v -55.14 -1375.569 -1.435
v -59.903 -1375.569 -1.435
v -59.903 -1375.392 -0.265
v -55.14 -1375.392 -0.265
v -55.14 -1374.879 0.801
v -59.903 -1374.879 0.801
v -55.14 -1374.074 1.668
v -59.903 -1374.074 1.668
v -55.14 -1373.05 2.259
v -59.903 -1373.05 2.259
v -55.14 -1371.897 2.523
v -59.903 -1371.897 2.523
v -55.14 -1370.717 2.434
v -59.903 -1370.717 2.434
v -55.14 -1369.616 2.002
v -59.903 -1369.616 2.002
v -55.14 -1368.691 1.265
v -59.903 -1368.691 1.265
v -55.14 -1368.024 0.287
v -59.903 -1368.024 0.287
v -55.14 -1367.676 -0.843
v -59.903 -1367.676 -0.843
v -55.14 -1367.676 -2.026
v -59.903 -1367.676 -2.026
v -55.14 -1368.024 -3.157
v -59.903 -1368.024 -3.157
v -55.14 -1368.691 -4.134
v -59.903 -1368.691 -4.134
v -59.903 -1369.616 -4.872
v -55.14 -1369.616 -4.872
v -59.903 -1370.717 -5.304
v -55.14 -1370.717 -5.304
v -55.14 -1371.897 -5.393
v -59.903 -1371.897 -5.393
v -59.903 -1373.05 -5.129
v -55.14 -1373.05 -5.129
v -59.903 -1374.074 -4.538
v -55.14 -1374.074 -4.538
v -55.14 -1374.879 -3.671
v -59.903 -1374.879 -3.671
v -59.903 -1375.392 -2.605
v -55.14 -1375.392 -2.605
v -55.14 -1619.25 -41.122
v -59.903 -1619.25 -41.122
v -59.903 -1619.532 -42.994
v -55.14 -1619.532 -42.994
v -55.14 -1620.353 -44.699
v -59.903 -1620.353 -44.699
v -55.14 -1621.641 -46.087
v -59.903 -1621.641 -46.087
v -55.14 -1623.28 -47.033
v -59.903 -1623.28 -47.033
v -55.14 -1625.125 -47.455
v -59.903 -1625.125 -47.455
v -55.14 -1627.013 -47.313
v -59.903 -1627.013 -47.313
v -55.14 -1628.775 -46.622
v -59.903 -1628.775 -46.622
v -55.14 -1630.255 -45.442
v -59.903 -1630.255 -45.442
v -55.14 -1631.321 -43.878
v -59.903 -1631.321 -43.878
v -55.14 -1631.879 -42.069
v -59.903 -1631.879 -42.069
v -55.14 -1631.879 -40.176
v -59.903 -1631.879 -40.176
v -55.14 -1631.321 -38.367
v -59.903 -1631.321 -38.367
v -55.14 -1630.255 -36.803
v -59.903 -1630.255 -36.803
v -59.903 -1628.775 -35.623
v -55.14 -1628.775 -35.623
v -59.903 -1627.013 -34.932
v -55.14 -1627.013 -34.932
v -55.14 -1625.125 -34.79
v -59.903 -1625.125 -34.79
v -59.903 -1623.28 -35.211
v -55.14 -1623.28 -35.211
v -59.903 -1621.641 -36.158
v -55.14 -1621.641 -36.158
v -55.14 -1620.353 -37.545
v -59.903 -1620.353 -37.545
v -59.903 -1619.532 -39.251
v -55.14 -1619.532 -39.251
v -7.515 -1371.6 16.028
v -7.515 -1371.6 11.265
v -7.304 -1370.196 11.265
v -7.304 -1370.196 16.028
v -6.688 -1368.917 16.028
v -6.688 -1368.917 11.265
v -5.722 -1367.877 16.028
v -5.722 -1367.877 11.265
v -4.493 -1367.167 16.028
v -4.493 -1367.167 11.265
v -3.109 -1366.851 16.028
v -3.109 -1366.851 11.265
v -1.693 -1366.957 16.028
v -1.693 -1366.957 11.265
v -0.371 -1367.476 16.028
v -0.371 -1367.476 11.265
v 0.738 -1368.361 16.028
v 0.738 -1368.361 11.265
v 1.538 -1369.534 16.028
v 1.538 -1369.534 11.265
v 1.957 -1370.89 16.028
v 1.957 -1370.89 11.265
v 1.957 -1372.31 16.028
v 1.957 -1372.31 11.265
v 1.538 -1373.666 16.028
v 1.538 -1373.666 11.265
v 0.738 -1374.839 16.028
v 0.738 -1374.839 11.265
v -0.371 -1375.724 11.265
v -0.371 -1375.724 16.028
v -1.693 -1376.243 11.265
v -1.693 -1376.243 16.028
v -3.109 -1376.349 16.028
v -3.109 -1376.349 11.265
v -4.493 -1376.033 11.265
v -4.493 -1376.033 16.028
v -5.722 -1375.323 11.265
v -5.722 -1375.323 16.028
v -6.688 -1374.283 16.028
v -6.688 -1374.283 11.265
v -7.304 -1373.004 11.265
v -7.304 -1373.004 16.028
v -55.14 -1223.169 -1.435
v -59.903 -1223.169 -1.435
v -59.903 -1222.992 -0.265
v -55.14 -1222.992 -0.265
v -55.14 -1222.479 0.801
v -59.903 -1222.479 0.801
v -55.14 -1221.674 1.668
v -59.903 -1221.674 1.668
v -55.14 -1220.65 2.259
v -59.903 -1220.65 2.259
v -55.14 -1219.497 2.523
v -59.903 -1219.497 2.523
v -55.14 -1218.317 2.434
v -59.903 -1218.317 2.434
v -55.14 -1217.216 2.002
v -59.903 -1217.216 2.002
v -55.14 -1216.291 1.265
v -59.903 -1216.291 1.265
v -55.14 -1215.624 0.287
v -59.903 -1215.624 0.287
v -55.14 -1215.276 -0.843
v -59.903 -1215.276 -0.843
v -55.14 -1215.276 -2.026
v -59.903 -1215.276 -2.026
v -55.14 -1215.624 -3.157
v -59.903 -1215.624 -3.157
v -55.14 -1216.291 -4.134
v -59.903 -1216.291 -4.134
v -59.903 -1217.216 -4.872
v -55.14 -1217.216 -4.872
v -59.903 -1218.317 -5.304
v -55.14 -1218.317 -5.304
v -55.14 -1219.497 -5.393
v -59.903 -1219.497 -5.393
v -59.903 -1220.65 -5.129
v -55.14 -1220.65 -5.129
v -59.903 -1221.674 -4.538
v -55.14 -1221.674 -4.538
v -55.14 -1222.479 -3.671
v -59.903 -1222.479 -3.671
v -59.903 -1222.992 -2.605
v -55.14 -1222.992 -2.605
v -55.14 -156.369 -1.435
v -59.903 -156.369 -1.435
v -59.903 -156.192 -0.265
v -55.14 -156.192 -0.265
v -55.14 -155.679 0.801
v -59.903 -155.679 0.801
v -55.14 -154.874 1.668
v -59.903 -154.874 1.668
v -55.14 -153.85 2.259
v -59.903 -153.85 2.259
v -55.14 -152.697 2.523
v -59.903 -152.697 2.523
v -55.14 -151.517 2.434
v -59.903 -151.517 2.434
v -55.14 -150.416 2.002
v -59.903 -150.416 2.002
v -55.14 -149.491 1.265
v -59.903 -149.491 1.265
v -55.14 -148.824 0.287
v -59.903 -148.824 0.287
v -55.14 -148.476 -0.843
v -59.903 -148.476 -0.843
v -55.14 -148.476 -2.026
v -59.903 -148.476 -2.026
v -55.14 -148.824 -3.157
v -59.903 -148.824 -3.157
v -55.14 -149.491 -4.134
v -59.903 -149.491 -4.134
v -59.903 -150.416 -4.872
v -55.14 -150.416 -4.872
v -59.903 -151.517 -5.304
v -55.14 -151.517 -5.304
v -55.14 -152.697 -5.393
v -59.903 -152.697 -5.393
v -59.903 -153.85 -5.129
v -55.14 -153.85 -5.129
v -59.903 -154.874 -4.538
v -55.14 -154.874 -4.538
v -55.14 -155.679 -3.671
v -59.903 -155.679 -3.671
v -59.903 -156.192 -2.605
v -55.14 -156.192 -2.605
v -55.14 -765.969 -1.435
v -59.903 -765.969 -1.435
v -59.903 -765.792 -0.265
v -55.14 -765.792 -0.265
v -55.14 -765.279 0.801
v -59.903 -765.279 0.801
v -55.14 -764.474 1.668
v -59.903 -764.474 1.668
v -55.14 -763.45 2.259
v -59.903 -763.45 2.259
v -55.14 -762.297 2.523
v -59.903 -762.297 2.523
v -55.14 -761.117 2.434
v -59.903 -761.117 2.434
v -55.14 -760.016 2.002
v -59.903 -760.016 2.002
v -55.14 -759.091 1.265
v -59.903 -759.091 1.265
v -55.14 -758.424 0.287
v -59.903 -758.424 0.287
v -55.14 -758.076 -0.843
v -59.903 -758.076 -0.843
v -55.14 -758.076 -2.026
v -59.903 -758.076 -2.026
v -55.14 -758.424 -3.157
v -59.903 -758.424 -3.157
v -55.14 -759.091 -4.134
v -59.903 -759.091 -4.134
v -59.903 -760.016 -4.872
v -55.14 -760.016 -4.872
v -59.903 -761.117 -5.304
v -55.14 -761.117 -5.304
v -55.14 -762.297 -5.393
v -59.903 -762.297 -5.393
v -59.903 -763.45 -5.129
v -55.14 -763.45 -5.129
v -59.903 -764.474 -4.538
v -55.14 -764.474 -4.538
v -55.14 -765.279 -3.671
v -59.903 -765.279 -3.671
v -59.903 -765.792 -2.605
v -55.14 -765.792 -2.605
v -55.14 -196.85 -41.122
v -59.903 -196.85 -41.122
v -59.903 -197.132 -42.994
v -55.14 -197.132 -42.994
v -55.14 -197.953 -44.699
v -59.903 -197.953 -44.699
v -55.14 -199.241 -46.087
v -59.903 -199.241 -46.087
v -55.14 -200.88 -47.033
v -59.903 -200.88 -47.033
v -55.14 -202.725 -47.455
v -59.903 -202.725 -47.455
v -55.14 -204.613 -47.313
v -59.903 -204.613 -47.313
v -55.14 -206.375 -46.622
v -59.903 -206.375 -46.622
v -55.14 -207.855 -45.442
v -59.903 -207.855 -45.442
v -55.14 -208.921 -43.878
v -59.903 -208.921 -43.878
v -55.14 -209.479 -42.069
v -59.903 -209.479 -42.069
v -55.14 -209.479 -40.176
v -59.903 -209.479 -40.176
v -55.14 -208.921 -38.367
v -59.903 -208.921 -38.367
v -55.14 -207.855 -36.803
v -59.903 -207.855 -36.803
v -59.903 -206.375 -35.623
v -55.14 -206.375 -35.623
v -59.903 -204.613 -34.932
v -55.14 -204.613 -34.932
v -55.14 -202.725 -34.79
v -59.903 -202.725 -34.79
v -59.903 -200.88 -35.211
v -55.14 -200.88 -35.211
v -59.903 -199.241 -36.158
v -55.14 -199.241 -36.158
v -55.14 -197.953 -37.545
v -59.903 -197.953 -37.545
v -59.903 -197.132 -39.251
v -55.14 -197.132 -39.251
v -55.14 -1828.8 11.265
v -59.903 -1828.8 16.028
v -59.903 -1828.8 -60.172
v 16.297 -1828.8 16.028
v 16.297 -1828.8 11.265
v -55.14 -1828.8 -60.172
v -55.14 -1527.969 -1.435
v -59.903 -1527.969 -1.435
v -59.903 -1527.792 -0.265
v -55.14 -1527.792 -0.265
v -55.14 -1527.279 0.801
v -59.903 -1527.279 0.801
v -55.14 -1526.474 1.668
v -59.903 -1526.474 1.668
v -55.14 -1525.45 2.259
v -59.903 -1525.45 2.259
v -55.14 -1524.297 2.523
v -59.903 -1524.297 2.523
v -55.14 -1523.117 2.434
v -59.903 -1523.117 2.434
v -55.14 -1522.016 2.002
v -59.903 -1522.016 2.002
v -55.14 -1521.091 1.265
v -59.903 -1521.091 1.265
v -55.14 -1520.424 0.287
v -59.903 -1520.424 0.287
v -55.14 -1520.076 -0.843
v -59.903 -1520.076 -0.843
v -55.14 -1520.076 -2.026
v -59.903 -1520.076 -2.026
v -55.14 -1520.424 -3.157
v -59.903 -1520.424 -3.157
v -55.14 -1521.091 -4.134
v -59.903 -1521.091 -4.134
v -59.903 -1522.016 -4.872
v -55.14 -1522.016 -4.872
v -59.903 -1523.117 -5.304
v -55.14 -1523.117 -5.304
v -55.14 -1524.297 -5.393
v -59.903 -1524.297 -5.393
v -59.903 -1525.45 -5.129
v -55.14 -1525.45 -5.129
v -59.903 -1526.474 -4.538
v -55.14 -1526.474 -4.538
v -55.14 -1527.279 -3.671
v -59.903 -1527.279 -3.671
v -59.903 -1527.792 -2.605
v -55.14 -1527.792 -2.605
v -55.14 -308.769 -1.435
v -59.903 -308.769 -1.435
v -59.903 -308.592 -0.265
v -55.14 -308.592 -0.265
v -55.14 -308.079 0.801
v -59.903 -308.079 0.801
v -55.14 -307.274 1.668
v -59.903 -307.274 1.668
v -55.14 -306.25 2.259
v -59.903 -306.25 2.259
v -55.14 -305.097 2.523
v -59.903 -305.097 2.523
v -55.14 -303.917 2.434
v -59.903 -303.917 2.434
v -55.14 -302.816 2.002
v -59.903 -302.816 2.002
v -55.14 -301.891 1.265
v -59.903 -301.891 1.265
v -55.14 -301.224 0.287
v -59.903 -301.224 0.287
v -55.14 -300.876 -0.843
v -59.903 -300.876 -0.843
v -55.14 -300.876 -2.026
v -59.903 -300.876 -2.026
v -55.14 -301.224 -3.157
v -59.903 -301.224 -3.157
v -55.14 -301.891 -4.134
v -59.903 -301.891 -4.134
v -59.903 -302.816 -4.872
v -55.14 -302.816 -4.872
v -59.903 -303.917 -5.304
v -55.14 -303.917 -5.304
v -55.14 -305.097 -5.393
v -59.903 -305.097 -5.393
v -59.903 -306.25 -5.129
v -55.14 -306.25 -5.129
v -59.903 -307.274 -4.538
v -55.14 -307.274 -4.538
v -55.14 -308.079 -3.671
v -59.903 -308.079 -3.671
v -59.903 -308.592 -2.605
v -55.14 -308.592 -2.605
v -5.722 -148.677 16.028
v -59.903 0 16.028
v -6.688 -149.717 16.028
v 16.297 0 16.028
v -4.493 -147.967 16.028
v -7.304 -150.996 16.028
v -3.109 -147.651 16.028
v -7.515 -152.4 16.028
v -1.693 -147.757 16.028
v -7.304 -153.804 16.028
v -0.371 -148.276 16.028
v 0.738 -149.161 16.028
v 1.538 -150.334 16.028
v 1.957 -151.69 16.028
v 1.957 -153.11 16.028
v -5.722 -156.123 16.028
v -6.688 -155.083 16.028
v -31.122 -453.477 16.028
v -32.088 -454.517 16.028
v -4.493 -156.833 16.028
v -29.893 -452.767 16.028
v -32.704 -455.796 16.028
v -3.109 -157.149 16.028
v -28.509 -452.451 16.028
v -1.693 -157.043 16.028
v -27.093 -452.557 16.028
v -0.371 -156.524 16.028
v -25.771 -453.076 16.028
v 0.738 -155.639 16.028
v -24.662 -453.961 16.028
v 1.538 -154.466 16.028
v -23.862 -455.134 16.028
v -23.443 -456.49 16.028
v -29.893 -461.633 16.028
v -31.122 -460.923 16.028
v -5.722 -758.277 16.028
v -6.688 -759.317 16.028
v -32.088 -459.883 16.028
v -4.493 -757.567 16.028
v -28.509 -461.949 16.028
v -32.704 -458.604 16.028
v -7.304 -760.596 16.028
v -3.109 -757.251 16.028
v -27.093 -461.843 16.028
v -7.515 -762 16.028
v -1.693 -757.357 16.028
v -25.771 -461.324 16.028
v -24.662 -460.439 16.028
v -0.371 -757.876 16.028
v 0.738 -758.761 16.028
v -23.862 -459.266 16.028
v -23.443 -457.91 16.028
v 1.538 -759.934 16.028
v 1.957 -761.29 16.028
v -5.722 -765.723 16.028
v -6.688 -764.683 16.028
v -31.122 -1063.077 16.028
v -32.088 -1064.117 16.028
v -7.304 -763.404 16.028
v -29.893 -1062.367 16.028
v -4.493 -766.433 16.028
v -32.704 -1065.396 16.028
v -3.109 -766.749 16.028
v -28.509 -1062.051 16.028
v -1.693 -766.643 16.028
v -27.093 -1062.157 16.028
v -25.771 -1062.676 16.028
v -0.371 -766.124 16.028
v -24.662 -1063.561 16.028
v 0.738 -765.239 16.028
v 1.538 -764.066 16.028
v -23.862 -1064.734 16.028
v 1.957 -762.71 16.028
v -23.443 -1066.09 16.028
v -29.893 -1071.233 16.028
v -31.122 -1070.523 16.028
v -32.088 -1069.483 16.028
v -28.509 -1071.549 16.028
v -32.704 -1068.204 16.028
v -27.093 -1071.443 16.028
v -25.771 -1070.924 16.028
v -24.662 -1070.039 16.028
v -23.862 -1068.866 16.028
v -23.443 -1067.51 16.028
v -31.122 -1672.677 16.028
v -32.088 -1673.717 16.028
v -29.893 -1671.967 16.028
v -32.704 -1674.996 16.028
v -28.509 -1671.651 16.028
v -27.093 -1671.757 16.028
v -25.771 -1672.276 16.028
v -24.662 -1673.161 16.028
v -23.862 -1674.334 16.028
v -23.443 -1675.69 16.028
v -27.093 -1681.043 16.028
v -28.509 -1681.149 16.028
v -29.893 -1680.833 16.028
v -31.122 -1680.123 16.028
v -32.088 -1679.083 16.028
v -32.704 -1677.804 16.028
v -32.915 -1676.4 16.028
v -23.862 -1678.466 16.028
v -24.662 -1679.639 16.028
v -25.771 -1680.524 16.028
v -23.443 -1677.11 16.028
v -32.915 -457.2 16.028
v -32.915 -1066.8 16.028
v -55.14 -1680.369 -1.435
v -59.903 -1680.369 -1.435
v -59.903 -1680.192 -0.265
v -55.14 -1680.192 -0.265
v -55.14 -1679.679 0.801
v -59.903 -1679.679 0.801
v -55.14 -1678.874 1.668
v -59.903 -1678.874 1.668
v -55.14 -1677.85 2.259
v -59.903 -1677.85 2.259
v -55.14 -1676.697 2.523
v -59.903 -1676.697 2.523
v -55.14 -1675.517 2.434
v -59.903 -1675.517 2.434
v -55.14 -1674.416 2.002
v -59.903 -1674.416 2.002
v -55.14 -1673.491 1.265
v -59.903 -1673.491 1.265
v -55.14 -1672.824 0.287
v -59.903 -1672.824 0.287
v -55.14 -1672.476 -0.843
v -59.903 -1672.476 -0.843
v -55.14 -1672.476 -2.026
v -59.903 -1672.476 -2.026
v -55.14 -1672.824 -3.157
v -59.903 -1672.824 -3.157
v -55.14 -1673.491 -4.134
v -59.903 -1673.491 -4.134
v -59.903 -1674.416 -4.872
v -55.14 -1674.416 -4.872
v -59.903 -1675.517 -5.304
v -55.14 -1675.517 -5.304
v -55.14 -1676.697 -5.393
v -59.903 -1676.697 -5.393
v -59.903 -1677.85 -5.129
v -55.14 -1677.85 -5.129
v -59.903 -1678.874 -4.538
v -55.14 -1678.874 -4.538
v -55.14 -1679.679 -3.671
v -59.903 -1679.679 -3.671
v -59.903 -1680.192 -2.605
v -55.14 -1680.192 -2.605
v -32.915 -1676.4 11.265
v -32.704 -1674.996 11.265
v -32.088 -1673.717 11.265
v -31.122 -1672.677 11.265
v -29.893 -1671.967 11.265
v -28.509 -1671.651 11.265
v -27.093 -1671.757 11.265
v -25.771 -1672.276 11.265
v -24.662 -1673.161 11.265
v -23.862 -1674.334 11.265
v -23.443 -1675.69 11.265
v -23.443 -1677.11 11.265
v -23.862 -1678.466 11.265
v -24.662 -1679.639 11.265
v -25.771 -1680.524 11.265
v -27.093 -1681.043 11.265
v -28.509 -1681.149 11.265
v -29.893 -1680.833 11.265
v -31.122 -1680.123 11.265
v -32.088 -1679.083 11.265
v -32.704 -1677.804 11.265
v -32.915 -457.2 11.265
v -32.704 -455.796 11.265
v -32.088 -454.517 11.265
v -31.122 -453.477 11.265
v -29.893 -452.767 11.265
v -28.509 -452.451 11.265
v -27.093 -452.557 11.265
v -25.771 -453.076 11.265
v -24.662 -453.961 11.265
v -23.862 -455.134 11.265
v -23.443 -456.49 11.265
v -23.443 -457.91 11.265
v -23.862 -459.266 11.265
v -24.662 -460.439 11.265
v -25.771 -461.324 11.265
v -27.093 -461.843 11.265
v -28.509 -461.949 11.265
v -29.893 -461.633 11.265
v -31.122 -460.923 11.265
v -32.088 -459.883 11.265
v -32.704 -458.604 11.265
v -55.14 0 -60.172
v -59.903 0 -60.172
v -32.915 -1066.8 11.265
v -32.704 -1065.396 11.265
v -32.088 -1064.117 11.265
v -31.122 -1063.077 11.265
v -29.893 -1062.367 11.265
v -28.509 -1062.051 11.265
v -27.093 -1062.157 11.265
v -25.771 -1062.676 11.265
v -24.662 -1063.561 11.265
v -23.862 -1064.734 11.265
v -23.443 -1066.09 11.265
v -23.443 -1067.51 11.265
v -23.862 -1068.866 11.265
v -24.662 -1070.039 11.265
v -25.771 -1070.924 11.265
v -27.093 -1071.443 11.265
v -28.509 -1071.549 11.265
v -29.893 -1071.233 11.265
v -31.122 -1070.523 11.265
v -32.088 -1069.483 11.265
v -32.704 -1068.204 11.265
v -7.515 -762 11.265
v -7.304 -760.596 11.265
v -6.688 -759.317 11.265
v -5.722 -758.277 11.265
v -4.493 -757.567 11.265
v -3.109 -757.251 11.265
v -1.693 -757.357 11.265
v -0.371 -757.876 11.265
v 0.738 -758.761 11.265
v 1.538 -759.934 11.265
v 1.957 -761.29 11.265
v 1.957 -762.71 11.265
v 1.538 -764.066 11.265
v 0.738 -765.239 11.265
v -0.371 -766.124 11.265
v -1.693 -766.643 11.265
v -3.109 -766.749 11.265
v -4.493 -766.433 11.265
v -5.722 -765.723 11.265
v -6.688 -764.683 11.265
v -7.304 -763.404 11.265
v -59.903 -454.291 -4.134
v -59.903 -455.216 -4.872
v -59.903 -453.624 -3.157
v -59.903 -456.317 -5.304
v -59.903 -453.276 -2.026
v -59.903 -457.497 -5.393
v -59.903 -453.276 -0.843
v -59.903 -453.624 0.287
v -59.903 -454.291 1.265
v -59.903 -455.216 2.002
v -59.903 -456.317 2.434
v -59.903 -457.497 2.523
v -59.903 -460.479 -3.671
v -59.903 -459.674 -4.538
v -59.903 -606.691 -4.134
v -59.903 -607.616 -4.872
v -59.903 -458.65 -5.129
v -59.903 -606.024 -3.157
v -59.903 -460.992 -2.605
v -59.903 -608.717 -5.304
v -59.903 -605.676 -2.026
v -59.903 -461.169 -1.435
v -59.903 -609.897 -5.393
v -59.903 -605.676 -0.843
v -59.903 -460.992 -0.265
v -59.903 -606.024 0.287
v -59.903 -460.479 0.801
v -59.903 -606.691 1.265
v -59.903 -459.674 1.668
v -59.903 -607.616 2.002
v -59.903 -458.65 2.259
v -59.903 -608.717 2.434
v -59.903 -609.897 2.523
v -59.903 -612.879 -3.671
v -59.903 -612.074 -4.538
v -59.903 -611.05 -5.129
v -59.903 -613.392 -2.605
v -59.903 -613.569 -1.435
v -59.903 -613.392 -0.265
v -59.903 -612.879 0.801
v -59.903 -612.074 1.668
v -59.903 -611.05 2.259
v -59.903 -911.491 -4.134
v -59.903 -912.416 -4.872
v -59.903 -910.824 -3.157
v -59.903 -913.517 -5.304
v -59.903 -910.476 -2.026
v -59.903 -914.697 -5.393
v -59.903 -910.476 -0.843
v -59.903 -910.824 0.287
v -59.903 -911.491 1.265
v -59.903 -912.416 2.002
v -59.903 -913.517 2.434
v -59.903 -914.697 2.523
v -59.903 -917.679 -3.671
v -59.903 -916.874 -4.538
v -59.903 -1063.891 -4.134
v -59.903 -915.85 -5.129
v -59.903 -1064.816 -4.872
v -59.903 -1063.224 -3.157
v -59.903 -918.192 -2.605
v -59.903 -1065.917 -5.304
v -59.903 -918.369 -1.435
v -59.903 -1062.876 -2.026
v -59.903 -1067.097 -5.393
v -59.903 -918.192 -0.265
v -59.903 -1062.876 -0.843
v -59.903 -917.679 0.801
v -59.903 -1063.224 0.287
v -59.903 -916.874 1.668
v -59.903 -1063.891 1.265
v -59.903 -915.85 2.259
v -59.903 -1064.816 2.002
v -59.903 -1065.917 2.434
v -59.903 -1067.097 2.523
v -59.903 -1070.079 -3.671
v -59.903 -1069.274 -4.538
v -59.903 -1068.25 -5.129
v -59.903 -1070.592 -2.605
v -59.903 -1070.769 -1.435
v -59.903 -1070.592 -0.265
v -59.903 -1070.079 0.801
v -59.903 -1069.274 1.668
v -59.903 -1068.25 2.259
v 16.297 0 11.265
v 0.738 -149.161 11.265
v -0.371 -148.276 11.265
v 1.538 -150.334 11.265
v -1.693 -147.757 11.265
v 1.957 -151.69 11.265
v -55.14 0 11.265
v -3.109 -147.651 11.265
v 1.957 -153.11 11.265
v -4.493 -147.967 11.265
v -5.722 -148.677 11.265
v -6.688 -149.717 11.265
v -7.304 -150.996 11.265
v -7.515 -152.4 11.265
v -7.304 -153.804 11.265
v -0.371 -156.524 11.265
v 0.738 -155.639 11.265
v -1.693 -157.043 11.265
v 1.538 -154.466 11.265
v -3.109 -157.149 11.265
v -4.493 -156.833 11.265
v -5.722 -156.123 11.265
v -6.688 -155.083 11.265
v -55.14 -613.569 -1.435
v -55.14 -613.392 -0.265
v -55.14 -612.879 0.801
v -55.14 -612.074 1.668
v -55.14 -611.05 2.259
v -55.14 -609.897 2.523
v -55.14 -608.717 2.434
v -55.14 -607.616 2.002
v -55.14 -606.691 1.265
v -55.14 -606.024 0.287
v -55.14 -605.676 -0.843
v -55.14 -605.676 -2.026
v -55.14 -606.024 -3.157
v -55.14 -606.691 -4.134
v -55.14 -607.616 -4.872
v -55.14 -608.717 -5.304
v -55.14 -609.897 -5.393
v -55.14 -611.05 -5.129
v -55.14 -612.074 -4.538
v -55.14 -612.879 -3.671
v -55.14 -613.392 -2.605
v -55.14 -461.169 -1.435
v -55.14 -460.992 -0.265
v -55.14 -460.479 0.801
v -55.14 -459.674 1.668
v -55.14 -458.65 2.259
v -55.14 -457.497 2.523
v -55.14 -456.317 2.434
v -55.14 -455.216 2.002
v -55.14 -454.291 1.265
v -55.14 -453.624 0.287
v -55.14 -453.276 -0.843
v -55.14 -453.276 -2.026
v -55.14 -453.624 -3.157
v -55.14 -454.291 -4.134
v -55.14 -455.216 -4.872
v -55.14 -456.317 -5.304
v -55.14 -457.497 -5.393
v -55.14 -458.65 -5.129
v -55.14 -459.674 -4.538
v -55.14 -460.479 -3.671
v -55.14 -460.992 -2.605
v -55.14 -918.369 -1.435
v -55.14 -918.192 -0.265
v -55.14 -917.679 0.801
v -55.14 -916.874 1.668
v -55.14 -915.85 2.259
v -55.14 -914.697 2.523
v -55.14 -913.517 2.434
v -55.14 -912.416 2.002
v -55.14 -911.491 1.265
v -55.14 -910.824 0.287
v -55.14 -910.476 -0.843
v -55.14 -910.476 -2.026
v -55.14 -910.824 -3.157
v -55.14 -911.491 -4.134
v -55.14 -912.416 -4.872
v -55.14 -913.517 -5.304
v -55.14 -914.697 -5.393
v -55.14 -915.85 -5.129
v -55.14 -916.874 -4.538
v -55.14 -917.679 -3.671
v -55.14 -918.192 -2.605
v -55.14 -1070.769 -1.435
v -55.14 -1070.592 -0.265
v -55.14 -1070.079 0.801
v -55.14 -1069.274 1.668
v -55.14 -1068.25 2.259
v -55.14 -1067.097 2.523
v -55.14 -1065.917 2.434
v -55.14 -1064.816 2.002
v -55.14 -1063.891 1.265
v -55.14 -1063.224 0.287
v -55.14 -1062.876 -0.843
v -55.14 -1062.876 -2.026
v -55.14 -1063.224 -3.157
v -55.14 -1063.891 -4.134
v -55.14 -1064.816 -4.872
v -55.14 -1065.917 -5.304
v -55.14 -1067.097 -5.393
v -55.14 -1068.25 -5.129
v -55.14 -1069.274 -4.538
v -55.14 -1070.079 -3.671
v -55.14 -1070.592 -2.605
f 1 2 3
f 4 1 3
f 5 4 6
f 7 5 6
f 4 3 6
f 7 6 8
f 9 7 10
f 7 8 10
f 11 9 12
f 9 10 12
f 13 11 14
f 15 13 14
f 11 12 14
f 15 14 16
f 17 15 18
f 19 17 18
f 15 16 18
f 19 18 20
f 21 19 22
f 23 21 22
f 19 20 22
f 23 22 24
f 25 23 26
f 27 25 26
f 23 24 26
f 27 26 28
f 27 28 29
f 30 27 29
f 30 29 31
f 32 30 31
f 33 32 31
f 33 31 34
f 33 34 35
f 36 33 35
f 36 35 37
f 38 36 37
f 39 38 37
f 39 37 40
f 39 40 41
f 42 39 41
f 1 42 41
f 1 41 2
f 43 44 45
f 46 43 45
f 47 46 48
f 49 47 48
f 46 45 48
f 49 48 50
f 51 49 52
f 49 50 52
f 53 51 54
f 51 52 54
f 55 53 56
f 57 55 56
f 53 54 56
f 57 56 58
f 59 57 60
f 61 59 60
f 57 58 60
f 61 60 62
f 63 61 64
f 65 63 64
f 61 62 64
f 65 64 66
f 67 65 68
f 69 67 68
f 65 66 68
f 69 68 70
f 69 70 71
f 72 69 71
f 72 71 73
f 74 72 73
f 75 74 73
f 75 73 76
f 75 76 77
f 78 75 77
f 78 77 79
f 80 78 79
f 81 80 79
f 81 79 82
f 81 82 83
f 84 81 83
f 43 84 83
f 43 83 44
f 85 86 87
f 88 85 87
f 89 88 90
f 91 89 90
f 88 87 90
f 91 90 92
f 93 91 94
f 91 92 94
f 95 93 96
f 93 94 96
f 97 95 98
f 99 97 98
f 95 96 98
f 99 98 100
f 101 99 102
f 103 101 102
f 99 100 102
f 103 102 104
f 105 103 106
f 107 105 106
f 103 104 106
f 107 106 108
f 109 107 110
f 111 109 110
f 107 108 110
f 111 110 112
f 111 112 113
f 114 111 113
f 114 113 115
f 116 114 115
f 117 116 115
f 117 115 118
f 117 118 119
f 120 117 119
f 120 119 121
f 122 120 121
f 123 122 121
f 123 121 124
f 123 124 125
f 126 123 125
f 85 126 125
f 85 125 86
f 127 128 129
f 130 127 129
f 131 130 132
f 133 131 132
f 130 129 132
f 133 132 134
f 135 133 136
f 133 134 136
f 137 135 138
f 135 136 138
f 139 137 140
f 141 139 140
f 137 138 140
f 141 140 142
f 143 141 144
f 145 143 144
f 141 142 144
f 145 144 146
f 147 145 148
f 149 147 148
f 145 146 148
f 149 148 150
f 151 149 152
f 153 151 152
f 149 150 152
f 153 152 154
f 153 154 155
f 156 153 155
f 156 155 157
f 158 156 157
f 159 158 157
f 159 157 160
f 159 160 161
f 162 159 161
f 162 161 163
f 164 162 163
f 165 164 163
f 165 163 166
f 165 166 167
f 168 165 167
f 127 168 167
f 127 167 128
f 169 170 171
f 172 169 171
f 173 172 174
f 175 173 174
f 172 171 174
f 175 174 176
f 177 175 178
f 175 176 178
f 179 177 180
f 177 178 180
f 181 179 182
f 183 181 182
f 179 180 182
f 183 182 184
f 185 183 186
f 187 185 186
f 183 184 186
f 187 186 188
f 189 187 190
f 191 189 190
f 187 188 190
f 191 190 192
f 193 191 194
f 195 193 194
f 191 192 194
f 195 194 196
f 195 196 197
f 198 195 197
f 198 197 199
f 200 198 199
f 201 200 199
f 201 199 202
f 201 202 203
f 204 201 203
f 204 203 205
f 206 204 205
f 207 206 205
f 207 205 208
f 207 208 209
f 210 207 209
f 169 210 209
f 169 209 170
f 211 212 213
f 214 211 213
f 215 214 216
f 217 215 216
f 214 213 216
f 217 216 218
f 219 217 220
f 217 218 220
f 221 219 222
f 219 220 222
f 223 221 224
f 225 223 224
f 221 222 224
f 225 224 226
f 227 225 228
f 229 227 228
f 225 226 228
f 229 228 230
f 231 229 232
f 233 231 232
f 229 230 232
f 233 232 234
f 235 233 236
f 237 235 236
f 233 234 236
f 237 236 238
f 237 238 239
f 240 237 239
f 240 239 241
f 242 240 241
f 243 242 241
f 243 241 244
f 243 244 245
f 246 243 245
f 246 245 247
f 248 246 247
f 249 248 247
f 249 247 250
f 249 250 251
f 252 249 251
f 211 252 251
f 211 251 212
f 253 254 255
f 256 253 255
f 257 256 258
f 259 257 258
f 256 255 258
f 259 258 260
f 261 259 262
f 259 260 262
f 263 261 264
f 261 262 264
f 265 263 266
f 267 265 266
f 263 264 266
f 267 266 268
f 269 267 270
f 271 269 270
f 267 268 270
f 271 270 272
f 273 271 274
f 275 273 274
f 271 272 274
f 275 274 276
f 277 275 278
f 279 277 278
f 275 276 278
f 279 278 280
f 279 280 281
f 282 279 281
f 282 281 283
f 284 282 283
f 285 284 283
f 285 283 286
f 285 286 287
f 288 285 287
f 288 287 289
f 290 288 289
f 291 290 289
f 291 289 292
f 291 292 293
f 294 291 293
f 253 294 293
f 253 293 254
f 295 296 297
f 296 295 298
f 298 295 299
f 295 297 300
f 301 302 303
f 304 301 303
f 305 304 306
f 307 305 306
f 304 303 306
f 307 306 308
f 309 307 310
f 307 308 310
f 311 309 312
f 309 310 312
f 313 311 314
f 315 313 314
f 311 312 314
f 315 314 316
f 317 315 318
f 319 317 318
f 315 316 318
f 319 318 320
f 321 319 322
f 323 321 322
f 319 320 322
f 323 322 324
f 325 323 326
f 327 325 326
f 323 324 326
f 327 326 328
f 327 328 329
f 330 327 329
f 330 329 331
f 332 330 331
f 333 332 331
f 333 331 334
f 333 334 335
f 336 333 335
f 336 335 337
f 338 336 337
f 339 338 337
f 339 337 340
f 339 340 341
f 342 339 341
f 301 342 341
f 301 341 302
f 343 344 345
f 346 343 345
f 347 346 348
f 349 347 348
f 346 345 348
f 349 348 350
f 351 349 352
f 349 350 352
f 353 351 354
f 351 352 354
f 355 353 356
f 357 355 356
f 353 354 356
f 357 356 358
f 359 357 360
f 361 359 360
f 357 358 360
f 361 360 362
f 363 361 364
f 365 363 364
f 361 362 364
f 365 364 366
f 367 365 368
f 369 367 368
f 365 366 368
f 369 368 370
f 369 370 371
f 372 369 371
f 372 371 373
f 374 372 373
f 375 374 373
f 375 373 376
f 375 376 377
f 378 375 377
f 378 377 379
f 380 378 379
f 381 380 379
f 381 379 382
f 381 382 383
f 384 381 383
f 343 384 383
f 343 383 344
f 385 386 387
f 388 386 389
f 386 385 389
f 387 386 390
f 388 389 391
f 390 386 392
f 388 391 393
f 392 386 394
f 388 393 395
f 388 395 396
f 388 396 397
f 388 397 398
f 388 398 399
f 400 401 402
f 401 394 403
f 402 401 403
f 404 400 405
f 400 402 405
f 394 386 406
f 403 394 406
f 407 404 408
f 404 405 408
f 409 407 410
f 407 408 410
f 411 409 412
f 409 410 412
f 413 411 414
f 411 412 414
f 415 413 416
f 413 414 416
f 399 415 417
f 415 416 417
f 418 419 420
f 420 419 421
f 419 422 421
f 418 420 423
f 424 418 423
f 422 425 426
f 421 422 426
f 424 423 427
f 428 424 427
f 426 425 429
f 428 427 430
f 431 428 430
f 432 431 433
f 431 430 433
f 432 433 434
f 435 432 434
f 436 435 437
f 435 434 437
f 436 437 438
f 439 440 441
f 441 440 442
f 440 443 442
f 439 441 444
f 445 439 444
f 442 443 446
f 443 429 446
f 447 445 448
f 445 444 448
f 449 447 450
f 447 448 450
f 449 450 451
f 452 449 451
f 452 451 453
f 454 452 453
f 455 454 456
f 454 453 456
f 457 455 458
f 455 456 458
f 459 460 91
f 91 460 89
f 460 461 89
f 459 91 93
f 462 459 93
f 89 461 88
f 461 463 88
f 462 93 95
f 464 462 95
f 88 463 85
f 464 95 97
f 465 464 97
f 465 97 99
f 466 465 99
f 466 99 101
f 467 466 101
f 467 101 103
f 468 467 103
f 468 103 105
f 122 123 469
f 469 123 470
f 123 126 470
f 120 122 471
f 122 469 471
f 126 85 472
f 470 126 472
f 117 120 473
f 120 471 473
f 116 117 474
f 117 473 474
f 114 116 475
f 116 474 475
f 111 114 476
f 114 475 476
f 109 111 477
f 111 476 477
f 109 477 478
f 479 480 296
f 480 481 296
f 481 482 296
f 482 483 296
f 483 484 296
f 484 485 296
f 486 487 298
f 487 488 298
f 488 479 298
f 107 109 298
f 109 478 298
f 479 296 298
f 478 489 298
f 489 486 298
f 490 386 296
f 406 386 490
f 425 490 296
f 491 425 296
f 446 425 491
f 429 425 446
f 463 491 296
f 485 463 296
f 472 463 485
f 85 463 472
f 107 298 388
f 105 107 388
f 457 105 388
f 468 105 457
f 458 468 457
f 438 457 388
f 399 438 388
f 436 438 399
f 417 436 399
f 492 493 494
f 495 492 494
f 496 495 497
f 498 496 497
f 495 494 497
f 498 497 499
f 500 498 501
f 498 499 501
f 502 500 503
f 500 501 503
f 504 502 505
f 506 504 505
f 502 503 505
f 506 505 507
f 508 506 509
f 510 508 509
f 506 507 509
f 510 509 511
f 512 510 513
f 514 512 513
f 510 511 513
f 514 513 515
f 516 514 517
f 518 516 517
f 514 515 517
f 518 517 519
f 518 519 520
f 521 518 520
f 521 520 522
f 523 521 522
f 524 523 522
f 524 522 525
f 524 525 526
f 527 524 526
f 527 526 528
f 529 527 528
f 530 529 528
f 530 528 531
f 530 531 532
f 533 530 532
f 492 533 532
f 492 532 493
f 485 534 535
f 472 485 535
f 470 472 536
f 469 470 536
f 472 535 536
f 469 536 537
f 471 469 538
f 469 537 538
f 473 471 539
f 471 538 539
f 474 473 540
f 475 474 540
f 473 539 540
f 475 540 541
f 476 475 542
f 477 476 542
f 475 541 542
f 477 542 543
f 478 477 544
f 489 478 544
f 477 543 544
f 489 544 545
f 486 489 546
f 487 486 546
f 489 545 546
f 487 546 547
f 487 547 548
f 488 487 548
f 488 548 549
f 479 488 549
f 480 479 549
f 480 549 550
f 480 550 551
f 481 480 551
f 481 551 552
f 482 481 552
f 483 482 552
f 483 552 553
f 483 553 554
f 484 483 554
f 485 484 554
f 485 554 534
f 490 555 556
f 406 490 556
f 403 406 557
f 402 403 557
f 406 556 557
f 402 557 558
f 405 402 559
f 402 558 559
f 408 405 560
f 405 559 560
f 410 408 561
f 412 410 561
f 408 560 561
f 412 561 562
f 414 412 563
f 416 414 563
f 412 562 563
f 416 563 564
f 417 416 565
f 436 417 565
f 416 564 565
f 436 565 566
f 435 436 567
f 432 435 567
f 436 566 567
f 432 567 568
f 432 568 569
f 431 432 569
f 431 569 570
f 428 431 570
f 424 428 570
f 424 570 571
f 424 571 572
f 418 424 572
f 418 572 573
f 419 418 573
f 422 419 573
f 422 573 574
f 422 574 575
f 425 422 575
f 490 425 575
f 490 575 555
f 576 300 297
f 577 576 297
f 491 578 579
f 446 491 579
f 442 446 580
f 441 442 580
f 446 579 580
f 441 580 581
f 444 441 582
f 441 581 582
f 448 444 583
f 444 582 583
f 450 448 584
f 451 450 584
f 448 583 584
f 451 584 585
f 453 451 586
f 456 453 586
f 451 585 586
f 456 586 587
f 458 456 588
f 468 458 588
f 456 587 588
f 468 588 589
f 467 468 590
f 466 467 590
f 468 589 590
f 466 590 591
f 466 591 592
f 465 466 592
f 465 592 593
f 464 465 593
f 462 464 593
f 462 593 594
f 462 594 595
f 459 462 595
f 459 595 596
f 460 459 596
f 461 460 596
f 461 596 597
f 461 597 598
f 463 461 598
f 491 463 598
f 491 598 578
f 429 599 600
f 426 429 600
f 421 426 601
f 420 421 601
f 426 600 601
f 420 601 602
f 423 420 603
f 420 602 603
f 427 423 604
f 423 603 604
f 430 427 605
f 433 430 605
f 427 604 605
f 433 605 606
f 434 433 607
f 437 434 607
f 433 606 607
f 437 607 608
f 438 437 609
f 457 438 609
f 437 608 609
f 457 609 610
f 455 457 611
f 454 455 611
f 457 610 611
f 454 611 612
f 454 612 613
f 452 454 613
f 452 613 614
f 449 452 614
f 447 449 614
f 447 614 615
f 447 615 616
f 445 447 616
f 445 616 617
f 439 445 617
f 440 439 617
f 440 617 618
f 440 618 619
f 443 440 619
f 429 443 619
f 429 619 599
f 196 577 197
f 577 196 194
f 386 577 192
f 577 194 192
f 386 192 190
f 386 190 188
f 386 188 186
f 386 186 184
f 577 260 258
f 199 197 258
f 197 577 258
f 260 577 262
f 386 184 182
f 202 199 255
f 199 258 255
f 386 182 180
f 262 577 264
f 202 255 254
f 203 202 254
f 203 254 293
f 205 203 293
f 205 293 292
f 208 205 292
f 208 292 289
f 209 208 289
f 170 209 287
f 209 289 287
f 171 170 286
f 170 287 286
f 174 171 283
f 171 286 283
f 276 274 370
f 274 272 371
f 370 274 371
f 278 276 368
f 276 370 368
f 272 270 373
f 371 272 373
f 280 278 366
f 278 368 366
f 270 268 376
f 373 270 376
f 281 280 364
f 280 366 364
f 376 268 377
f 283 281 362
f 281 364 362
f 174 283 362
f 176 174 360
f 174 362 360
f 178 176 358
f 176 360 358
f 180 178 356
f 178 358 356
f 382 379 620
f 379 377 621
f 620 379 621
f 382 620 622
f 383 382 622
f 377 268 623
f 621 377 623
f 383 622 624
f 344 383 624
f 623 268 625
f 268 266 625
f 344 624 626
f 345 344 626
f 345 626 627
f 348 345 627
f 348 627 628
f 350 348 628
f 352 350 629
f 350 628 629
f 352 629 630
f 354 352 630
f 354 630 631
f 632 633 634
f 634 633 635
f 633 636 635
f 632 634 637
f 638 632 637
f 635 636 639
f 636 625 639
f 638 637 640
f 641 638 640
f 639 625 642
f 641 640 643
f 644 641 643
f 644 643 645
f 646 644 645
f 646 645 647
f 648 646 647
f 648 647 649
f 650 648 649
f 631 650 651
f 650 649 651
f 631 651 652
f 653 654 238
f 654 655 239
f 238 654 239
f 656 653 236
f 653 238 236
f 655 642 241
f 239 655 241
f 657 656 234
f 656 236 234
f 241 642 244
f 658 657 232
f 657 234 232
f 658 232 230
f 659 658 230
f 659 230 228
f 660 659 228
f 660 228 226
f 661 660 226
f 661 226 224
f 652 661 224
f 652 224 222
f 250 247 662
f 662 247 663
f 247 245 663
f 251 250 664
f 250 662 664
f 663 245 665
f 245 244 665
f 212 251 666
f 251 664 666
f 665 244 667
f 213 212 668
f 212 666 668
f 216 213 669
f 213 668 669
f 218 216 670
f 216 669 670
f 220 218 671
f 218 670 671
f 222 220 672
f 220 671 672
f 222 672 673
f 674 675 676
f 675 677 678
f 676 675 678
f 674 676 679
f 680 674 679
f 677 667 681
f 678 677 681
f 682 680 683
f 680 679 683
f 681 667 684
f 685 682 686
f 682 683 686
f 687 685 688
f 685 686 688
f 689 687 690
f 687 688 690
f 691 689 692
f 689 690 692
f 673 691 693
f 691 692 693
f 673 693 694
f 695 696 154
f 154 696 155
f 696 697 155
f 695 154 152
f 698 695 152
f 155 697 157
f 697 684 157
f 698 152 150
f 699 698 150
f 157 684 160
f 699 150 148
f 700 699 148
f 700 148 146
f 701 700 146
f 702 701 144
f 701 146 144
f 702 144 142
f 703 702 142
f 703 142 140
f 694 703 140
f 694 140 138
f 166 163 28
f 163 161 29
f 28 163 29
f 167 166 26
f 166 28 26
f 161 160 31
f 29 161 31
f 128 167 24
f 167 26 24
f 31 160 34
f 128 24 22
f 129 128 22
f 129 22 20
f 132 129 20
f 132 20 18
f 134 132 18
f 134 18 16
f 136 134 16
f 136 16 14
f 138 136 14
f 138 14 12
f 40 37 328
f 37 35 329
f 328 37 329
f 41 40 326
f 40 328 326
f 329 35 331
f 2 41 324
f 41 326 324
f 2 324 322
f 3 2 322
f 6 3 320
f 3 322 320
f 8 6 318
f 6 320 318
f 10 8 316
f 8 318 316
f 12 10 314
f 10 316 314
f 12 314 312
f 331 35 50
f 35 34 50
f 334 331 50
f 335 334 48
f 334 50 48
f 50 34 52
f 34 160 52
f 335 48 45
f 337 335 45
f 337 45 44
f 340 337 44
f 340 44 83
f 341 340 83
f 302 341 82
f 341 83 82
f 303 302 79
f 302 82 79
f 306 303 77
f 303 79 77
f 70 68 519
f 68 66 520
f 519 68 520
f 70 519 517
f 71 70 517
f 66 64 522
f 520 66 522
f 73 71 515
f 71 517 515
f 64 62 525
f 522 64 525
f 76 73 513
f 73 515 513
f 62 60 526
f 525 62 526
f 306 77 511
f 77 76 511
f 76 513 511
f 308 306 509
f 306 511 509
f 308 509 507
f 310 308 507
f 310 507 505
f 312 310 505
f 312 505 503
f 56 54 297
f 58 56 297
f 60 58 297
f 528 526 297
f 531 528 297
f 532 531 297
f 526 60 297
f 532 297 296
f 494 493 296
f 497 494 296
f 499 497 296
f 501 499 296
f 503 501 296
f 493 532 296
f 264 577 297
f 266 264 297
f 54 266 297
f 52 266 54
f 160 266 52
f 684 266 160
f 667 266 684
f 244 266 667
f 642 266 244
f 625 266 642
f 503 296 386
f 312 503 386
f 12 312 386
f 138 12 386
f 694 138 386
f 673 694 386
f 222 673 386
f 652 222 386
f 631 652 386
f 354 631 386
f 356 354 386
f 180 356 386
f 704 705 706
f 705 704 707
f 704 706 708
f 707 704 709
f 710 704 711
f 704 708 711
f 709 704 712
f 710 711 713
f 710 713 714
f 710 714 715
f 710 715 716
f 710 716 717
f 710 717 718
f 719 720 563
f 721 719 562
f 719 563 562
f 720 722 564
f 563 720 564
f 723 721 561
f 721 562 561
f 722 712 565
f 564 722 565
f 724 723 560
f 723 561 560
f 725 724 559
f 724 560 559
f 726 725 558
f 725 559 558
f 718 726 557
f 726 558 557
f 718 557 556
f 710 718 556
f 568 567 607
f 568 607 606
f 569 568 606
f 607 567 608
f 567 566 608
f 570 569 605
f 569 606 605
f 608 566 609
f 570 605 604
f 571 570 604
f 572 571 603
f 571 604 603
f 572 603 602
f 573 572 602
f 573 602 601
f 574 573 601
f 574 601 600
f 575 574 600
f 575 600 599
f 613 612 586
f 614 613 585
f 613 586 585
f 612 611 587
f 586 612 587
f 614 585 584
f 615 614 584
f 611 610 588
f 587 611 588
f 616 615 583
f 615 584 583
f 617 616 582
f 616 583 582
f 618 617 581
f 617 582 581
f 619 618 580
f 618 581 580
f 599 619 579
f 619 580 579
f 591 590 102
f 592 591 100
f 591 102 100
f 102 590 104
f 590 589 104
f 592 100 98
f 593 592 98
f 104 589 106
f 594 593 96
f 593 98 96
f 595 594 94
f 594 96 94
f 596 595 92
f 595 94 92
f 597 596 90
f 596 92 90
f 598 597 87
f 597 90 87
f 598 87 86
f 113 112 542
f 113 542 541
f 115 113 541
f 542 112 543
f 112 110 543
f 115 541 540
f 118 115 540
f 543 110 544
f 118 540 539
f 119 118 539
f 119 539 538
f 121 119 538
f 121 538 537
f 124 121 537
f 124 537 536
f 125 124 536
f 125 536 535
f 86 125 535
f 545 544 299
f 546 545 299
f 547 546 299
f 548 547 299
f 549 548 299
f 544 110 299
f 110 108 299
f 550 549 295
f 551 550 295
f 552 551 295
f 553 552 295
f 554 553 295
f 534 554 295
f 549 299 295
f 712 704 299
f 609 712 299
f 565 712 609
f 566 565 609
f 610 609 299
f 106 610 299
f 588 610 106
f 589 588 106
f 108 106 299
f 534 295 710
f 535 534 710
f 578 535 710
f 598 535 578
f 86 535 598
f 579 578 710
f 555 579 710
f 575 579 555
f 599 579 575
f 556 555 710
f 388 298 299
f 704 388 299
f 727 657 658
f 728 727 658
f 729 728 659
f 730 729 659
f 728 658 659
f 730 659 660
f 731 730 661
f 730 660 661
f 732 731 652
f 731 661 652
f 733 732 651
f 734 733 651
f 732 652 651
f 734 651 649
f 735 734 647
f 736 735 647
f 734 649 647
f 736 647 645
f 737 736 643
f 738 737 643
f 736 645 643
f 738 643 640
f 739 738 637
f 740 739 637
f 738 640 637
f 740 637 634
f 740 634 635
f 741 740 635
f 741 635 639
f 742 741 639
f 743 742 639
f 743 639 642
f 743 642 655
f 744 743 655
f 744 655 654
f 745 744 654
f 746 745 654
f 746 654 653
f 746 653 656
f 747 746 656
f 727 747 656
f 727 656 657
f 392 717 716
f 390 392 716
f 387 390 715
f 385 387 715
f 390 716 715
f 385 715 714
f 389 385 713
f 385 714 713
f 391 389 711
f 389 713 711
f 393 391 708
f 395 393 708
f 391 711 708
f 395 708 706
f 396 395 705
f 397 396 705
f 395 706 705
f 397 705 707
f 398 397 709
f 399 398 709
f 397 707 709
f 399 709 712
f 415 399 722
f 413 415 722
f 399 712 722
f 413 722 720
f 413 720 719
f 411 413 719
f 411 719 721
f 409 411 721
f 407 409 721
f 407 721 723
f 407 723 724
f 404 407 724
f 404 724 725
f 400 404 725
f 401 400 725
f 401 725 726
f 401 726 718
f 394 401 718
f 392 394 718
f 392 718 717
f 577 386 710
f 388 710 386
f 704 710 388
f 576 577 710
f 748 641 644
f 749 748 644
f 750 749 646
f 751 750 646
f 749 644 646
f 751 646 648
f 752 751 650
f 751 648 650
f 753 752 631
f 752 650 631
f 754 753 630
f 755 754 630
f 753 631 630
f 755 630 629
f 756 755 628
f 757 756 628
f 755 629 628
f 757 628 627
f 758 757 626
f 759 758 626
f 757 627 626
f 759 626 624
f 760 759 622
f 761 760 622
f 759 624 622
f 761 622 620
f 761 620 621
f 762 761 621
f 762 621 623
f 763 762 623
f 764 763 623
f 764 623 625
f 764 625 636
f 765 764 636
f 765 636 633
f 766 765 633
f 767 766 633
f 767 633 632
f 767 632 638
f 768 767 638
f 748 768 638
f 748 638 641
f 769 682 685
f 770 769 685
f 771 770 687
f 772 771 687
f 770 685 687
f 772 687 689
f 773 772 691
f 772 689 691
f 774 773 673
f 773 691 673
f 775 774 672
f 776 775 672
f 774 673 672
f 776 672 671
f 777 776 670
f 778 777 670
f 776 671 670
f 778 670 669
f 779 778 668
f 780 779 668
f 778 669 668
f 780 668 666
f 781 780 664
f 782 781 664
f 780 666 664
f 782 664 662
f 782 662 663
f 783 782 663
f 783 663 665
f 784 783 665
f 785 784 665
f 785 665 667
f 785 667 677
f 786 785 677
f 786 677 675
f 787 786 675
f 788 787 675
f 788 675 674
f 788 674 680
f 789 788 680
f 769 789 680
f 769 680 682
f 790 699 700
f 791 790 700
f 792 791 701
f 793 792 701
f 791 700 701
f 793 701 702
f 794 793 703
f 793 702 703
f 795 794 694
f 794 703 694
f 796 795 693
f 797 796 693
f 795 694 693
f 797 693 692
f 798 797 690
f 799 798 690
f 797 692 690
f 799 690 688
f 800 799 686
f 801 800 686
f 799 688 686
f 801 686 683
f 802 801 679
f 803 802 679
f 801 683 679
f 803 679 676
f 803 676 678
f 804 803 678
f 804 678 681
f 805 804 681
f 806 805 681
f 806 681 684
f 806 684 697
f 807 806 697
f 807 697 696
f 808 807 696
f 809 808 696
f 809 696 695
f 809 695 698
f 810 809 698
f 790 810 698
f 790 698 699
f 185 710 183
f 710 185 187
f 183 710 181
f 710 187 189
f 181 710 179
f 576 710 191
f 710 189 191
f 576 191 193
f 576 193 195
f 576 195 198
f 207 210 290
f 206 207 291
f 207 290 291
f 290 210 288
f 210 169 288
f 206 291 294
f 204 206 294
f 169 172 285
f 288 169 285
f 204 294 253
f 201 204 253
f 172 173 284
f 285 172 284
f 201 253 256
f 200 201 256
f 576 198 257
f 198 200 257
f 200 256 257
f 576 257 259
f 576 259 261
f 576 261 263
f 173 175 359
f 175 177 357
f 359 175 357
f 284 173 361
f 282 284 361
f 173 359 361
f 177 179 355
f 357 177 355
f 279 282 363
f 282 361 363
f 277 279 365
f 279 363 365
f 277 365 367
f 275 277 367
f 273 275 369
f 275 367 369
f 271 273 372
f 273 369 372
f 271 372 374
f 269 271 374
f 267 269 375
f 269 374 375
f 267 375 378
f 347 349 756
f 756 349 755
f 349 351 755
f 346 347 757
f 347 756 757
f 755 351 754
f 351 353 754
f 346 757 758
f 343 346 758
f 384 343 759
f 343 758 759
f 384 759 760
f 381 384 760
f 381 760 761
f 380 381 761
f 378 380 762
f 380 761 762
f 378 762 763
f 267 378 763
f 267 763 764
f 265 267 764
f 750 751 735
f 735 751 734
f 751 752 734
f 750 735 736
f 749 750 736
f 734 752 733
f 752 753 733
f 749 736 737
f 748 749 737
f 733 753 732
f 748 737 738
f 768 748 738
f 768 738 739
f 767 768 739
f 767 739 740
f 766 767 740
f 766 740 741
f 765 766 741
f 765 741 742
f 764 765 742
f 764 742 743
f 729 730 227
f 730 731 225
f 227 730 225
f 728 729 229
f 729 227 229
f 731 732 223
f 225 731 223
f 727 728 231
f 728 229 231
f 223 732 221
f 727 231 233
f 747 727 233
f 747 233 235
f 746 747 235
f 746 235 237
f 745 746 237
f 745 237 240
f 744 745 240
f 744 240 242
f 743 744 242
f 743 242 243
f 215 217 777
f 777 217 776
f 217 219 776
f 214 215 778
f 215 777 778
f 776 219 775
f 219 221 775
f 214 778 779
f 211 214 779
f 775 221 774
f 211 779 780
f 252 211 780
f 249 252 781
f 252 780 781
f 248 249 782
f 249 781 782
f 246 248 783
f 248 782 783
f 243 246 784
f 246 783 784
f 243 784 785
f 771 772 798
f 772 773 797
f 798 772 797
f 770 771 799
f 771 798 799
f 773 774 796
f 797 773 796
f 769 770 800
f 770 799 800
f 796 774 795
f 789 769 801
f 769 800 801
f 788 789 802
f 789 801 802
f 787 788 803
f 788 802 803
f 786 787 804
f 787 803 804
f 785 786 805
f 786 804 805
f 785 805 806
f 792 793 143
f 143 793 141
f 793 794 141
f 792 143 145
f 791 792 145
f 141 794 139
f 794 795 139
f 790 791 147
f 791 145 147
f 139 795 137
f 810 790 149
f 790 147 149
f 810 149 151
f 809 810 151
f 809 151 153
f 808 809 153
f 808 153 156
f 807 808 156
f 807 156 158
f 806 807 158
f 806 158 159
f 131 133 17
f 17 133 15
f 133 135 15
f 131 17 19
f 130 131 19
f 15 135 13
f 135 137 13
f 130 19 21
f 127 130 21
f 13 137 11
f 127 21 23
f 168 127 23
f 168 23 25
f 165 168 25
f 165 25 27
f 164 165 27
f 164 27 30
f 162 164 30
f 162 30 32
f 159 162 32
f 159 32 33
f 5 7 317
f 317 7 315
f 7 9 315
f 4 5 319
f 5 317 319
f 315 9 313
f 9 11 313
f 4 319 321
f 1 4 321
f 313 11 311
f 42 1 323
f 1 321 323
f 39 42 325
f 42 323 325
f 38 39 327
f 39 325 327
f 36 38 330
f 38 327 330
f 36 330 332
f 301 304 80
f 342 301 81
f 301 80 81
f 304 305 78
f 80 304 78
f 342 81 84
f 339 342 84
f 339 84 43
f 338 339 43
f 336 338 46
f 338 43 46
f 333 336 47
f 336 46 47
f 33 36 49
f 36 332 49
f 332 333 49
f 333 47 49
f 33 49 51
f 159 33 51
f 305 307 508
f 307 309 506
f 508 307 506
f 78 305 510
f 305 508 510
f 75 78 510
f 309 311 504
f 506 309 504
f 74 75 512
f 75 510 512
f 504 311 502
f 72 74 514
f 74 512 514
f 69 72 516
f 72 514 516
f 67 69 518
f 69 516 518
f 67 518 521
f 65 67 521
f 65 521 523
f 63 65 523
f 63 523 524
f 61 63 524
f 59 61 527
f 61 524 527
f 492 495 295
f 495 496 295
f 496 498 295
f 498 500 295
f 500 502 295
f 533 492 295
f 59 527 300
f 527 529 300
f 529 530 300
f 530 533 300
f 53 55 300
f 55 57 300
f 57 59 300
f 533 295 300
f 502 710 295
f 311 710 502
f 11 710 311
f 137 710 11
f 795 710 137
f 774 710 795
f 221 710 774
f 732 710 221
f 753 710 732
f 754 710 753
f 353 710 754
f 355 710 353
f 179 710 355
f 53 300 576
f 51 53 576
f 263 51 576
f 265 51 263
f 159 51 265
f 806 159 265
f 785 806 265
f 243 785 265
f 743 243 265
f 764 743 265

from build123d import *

# Parameters (mm, degrees)
F1_DEPTH = 1828.8
F3_D     = 12.7
F5_D     = 9.525
F6_ANGLE = 180
F9_D     = 7.9375


# Not quite as in the source:
# - a length typed as a fraction of an inch, garbled in the dataset ("3 / 203.2 mm" for 3/8 in), is restored
# - a feature names something its author has since deleted; it is built from what else it names


with BuildPart() as f1:
    # F0 (on Front) → F1 (new body)
    with BuildSketch(Plane.XZ):
        Polygon((-59.9026924796, 82.7025878191), (-59.9026924796, 6.5025878191), (16.2973075204, 6.5025878191), (16.2973075204, 11.2650878191), (-55.1401924796, 11.2650878191), (-55.1401924796, 82.7025878191), align=None)
    extrude(amount=F1_DEPTH)

    # F3 (through all)
    with Locations(Plane.YZ.offset(-55.1401924796)):
        with Locations((-203.2, 63.6525878191), (-1625.6, 63.6525878191)):
            Hole(F3_D / 2)

    # F5 (through all)
    with Locations(Plane(origin=(0, 0, 0), x_dir=(1, 0, 0), z_dir=(0, 0, -1))):
        with Locations((-28.1526924796, 1371.6), (-2.7526924796, 1676.4), (-2.7526924796, 1066.8), (-28.1526924796, 762), (-2.7526924796, 457.2), (-28.1526924796, 152.4)):
            Hole(F5_D / 2)


with BuildPart() as f1_1:
    # F6: moved
    add(f1.part.rotate(Axis((-19.4214424796, -1828.8, 11.2650878191), (-1, 0, 0)), F6_ANGLE))


with BuildPart() as f1_2:
    # F7: moved
    add(f1_1.part.moved(Location((0, 1828.8, 0))))

    # F9 (through all)
    with Locations(Plane.YZ.offset(-55.1401924796)):
        with Locations((-152.4, -1.4349121809), (-304.8, -1.4349121809), (-457.2, -1.4349121809), (-609.6, -1.4349121809), (-762, -1.4349121809), (-914.4, -1.4349121809), (-1066.8, -1.4349121809), (-1219.2, -1.4349121809), (-1371.6, -1.4349121809), (-1524, -1.4349121809), (-1676.4, -1.4349121809)):
            Hole(F9_D / 2)


solid = f1_2.part
